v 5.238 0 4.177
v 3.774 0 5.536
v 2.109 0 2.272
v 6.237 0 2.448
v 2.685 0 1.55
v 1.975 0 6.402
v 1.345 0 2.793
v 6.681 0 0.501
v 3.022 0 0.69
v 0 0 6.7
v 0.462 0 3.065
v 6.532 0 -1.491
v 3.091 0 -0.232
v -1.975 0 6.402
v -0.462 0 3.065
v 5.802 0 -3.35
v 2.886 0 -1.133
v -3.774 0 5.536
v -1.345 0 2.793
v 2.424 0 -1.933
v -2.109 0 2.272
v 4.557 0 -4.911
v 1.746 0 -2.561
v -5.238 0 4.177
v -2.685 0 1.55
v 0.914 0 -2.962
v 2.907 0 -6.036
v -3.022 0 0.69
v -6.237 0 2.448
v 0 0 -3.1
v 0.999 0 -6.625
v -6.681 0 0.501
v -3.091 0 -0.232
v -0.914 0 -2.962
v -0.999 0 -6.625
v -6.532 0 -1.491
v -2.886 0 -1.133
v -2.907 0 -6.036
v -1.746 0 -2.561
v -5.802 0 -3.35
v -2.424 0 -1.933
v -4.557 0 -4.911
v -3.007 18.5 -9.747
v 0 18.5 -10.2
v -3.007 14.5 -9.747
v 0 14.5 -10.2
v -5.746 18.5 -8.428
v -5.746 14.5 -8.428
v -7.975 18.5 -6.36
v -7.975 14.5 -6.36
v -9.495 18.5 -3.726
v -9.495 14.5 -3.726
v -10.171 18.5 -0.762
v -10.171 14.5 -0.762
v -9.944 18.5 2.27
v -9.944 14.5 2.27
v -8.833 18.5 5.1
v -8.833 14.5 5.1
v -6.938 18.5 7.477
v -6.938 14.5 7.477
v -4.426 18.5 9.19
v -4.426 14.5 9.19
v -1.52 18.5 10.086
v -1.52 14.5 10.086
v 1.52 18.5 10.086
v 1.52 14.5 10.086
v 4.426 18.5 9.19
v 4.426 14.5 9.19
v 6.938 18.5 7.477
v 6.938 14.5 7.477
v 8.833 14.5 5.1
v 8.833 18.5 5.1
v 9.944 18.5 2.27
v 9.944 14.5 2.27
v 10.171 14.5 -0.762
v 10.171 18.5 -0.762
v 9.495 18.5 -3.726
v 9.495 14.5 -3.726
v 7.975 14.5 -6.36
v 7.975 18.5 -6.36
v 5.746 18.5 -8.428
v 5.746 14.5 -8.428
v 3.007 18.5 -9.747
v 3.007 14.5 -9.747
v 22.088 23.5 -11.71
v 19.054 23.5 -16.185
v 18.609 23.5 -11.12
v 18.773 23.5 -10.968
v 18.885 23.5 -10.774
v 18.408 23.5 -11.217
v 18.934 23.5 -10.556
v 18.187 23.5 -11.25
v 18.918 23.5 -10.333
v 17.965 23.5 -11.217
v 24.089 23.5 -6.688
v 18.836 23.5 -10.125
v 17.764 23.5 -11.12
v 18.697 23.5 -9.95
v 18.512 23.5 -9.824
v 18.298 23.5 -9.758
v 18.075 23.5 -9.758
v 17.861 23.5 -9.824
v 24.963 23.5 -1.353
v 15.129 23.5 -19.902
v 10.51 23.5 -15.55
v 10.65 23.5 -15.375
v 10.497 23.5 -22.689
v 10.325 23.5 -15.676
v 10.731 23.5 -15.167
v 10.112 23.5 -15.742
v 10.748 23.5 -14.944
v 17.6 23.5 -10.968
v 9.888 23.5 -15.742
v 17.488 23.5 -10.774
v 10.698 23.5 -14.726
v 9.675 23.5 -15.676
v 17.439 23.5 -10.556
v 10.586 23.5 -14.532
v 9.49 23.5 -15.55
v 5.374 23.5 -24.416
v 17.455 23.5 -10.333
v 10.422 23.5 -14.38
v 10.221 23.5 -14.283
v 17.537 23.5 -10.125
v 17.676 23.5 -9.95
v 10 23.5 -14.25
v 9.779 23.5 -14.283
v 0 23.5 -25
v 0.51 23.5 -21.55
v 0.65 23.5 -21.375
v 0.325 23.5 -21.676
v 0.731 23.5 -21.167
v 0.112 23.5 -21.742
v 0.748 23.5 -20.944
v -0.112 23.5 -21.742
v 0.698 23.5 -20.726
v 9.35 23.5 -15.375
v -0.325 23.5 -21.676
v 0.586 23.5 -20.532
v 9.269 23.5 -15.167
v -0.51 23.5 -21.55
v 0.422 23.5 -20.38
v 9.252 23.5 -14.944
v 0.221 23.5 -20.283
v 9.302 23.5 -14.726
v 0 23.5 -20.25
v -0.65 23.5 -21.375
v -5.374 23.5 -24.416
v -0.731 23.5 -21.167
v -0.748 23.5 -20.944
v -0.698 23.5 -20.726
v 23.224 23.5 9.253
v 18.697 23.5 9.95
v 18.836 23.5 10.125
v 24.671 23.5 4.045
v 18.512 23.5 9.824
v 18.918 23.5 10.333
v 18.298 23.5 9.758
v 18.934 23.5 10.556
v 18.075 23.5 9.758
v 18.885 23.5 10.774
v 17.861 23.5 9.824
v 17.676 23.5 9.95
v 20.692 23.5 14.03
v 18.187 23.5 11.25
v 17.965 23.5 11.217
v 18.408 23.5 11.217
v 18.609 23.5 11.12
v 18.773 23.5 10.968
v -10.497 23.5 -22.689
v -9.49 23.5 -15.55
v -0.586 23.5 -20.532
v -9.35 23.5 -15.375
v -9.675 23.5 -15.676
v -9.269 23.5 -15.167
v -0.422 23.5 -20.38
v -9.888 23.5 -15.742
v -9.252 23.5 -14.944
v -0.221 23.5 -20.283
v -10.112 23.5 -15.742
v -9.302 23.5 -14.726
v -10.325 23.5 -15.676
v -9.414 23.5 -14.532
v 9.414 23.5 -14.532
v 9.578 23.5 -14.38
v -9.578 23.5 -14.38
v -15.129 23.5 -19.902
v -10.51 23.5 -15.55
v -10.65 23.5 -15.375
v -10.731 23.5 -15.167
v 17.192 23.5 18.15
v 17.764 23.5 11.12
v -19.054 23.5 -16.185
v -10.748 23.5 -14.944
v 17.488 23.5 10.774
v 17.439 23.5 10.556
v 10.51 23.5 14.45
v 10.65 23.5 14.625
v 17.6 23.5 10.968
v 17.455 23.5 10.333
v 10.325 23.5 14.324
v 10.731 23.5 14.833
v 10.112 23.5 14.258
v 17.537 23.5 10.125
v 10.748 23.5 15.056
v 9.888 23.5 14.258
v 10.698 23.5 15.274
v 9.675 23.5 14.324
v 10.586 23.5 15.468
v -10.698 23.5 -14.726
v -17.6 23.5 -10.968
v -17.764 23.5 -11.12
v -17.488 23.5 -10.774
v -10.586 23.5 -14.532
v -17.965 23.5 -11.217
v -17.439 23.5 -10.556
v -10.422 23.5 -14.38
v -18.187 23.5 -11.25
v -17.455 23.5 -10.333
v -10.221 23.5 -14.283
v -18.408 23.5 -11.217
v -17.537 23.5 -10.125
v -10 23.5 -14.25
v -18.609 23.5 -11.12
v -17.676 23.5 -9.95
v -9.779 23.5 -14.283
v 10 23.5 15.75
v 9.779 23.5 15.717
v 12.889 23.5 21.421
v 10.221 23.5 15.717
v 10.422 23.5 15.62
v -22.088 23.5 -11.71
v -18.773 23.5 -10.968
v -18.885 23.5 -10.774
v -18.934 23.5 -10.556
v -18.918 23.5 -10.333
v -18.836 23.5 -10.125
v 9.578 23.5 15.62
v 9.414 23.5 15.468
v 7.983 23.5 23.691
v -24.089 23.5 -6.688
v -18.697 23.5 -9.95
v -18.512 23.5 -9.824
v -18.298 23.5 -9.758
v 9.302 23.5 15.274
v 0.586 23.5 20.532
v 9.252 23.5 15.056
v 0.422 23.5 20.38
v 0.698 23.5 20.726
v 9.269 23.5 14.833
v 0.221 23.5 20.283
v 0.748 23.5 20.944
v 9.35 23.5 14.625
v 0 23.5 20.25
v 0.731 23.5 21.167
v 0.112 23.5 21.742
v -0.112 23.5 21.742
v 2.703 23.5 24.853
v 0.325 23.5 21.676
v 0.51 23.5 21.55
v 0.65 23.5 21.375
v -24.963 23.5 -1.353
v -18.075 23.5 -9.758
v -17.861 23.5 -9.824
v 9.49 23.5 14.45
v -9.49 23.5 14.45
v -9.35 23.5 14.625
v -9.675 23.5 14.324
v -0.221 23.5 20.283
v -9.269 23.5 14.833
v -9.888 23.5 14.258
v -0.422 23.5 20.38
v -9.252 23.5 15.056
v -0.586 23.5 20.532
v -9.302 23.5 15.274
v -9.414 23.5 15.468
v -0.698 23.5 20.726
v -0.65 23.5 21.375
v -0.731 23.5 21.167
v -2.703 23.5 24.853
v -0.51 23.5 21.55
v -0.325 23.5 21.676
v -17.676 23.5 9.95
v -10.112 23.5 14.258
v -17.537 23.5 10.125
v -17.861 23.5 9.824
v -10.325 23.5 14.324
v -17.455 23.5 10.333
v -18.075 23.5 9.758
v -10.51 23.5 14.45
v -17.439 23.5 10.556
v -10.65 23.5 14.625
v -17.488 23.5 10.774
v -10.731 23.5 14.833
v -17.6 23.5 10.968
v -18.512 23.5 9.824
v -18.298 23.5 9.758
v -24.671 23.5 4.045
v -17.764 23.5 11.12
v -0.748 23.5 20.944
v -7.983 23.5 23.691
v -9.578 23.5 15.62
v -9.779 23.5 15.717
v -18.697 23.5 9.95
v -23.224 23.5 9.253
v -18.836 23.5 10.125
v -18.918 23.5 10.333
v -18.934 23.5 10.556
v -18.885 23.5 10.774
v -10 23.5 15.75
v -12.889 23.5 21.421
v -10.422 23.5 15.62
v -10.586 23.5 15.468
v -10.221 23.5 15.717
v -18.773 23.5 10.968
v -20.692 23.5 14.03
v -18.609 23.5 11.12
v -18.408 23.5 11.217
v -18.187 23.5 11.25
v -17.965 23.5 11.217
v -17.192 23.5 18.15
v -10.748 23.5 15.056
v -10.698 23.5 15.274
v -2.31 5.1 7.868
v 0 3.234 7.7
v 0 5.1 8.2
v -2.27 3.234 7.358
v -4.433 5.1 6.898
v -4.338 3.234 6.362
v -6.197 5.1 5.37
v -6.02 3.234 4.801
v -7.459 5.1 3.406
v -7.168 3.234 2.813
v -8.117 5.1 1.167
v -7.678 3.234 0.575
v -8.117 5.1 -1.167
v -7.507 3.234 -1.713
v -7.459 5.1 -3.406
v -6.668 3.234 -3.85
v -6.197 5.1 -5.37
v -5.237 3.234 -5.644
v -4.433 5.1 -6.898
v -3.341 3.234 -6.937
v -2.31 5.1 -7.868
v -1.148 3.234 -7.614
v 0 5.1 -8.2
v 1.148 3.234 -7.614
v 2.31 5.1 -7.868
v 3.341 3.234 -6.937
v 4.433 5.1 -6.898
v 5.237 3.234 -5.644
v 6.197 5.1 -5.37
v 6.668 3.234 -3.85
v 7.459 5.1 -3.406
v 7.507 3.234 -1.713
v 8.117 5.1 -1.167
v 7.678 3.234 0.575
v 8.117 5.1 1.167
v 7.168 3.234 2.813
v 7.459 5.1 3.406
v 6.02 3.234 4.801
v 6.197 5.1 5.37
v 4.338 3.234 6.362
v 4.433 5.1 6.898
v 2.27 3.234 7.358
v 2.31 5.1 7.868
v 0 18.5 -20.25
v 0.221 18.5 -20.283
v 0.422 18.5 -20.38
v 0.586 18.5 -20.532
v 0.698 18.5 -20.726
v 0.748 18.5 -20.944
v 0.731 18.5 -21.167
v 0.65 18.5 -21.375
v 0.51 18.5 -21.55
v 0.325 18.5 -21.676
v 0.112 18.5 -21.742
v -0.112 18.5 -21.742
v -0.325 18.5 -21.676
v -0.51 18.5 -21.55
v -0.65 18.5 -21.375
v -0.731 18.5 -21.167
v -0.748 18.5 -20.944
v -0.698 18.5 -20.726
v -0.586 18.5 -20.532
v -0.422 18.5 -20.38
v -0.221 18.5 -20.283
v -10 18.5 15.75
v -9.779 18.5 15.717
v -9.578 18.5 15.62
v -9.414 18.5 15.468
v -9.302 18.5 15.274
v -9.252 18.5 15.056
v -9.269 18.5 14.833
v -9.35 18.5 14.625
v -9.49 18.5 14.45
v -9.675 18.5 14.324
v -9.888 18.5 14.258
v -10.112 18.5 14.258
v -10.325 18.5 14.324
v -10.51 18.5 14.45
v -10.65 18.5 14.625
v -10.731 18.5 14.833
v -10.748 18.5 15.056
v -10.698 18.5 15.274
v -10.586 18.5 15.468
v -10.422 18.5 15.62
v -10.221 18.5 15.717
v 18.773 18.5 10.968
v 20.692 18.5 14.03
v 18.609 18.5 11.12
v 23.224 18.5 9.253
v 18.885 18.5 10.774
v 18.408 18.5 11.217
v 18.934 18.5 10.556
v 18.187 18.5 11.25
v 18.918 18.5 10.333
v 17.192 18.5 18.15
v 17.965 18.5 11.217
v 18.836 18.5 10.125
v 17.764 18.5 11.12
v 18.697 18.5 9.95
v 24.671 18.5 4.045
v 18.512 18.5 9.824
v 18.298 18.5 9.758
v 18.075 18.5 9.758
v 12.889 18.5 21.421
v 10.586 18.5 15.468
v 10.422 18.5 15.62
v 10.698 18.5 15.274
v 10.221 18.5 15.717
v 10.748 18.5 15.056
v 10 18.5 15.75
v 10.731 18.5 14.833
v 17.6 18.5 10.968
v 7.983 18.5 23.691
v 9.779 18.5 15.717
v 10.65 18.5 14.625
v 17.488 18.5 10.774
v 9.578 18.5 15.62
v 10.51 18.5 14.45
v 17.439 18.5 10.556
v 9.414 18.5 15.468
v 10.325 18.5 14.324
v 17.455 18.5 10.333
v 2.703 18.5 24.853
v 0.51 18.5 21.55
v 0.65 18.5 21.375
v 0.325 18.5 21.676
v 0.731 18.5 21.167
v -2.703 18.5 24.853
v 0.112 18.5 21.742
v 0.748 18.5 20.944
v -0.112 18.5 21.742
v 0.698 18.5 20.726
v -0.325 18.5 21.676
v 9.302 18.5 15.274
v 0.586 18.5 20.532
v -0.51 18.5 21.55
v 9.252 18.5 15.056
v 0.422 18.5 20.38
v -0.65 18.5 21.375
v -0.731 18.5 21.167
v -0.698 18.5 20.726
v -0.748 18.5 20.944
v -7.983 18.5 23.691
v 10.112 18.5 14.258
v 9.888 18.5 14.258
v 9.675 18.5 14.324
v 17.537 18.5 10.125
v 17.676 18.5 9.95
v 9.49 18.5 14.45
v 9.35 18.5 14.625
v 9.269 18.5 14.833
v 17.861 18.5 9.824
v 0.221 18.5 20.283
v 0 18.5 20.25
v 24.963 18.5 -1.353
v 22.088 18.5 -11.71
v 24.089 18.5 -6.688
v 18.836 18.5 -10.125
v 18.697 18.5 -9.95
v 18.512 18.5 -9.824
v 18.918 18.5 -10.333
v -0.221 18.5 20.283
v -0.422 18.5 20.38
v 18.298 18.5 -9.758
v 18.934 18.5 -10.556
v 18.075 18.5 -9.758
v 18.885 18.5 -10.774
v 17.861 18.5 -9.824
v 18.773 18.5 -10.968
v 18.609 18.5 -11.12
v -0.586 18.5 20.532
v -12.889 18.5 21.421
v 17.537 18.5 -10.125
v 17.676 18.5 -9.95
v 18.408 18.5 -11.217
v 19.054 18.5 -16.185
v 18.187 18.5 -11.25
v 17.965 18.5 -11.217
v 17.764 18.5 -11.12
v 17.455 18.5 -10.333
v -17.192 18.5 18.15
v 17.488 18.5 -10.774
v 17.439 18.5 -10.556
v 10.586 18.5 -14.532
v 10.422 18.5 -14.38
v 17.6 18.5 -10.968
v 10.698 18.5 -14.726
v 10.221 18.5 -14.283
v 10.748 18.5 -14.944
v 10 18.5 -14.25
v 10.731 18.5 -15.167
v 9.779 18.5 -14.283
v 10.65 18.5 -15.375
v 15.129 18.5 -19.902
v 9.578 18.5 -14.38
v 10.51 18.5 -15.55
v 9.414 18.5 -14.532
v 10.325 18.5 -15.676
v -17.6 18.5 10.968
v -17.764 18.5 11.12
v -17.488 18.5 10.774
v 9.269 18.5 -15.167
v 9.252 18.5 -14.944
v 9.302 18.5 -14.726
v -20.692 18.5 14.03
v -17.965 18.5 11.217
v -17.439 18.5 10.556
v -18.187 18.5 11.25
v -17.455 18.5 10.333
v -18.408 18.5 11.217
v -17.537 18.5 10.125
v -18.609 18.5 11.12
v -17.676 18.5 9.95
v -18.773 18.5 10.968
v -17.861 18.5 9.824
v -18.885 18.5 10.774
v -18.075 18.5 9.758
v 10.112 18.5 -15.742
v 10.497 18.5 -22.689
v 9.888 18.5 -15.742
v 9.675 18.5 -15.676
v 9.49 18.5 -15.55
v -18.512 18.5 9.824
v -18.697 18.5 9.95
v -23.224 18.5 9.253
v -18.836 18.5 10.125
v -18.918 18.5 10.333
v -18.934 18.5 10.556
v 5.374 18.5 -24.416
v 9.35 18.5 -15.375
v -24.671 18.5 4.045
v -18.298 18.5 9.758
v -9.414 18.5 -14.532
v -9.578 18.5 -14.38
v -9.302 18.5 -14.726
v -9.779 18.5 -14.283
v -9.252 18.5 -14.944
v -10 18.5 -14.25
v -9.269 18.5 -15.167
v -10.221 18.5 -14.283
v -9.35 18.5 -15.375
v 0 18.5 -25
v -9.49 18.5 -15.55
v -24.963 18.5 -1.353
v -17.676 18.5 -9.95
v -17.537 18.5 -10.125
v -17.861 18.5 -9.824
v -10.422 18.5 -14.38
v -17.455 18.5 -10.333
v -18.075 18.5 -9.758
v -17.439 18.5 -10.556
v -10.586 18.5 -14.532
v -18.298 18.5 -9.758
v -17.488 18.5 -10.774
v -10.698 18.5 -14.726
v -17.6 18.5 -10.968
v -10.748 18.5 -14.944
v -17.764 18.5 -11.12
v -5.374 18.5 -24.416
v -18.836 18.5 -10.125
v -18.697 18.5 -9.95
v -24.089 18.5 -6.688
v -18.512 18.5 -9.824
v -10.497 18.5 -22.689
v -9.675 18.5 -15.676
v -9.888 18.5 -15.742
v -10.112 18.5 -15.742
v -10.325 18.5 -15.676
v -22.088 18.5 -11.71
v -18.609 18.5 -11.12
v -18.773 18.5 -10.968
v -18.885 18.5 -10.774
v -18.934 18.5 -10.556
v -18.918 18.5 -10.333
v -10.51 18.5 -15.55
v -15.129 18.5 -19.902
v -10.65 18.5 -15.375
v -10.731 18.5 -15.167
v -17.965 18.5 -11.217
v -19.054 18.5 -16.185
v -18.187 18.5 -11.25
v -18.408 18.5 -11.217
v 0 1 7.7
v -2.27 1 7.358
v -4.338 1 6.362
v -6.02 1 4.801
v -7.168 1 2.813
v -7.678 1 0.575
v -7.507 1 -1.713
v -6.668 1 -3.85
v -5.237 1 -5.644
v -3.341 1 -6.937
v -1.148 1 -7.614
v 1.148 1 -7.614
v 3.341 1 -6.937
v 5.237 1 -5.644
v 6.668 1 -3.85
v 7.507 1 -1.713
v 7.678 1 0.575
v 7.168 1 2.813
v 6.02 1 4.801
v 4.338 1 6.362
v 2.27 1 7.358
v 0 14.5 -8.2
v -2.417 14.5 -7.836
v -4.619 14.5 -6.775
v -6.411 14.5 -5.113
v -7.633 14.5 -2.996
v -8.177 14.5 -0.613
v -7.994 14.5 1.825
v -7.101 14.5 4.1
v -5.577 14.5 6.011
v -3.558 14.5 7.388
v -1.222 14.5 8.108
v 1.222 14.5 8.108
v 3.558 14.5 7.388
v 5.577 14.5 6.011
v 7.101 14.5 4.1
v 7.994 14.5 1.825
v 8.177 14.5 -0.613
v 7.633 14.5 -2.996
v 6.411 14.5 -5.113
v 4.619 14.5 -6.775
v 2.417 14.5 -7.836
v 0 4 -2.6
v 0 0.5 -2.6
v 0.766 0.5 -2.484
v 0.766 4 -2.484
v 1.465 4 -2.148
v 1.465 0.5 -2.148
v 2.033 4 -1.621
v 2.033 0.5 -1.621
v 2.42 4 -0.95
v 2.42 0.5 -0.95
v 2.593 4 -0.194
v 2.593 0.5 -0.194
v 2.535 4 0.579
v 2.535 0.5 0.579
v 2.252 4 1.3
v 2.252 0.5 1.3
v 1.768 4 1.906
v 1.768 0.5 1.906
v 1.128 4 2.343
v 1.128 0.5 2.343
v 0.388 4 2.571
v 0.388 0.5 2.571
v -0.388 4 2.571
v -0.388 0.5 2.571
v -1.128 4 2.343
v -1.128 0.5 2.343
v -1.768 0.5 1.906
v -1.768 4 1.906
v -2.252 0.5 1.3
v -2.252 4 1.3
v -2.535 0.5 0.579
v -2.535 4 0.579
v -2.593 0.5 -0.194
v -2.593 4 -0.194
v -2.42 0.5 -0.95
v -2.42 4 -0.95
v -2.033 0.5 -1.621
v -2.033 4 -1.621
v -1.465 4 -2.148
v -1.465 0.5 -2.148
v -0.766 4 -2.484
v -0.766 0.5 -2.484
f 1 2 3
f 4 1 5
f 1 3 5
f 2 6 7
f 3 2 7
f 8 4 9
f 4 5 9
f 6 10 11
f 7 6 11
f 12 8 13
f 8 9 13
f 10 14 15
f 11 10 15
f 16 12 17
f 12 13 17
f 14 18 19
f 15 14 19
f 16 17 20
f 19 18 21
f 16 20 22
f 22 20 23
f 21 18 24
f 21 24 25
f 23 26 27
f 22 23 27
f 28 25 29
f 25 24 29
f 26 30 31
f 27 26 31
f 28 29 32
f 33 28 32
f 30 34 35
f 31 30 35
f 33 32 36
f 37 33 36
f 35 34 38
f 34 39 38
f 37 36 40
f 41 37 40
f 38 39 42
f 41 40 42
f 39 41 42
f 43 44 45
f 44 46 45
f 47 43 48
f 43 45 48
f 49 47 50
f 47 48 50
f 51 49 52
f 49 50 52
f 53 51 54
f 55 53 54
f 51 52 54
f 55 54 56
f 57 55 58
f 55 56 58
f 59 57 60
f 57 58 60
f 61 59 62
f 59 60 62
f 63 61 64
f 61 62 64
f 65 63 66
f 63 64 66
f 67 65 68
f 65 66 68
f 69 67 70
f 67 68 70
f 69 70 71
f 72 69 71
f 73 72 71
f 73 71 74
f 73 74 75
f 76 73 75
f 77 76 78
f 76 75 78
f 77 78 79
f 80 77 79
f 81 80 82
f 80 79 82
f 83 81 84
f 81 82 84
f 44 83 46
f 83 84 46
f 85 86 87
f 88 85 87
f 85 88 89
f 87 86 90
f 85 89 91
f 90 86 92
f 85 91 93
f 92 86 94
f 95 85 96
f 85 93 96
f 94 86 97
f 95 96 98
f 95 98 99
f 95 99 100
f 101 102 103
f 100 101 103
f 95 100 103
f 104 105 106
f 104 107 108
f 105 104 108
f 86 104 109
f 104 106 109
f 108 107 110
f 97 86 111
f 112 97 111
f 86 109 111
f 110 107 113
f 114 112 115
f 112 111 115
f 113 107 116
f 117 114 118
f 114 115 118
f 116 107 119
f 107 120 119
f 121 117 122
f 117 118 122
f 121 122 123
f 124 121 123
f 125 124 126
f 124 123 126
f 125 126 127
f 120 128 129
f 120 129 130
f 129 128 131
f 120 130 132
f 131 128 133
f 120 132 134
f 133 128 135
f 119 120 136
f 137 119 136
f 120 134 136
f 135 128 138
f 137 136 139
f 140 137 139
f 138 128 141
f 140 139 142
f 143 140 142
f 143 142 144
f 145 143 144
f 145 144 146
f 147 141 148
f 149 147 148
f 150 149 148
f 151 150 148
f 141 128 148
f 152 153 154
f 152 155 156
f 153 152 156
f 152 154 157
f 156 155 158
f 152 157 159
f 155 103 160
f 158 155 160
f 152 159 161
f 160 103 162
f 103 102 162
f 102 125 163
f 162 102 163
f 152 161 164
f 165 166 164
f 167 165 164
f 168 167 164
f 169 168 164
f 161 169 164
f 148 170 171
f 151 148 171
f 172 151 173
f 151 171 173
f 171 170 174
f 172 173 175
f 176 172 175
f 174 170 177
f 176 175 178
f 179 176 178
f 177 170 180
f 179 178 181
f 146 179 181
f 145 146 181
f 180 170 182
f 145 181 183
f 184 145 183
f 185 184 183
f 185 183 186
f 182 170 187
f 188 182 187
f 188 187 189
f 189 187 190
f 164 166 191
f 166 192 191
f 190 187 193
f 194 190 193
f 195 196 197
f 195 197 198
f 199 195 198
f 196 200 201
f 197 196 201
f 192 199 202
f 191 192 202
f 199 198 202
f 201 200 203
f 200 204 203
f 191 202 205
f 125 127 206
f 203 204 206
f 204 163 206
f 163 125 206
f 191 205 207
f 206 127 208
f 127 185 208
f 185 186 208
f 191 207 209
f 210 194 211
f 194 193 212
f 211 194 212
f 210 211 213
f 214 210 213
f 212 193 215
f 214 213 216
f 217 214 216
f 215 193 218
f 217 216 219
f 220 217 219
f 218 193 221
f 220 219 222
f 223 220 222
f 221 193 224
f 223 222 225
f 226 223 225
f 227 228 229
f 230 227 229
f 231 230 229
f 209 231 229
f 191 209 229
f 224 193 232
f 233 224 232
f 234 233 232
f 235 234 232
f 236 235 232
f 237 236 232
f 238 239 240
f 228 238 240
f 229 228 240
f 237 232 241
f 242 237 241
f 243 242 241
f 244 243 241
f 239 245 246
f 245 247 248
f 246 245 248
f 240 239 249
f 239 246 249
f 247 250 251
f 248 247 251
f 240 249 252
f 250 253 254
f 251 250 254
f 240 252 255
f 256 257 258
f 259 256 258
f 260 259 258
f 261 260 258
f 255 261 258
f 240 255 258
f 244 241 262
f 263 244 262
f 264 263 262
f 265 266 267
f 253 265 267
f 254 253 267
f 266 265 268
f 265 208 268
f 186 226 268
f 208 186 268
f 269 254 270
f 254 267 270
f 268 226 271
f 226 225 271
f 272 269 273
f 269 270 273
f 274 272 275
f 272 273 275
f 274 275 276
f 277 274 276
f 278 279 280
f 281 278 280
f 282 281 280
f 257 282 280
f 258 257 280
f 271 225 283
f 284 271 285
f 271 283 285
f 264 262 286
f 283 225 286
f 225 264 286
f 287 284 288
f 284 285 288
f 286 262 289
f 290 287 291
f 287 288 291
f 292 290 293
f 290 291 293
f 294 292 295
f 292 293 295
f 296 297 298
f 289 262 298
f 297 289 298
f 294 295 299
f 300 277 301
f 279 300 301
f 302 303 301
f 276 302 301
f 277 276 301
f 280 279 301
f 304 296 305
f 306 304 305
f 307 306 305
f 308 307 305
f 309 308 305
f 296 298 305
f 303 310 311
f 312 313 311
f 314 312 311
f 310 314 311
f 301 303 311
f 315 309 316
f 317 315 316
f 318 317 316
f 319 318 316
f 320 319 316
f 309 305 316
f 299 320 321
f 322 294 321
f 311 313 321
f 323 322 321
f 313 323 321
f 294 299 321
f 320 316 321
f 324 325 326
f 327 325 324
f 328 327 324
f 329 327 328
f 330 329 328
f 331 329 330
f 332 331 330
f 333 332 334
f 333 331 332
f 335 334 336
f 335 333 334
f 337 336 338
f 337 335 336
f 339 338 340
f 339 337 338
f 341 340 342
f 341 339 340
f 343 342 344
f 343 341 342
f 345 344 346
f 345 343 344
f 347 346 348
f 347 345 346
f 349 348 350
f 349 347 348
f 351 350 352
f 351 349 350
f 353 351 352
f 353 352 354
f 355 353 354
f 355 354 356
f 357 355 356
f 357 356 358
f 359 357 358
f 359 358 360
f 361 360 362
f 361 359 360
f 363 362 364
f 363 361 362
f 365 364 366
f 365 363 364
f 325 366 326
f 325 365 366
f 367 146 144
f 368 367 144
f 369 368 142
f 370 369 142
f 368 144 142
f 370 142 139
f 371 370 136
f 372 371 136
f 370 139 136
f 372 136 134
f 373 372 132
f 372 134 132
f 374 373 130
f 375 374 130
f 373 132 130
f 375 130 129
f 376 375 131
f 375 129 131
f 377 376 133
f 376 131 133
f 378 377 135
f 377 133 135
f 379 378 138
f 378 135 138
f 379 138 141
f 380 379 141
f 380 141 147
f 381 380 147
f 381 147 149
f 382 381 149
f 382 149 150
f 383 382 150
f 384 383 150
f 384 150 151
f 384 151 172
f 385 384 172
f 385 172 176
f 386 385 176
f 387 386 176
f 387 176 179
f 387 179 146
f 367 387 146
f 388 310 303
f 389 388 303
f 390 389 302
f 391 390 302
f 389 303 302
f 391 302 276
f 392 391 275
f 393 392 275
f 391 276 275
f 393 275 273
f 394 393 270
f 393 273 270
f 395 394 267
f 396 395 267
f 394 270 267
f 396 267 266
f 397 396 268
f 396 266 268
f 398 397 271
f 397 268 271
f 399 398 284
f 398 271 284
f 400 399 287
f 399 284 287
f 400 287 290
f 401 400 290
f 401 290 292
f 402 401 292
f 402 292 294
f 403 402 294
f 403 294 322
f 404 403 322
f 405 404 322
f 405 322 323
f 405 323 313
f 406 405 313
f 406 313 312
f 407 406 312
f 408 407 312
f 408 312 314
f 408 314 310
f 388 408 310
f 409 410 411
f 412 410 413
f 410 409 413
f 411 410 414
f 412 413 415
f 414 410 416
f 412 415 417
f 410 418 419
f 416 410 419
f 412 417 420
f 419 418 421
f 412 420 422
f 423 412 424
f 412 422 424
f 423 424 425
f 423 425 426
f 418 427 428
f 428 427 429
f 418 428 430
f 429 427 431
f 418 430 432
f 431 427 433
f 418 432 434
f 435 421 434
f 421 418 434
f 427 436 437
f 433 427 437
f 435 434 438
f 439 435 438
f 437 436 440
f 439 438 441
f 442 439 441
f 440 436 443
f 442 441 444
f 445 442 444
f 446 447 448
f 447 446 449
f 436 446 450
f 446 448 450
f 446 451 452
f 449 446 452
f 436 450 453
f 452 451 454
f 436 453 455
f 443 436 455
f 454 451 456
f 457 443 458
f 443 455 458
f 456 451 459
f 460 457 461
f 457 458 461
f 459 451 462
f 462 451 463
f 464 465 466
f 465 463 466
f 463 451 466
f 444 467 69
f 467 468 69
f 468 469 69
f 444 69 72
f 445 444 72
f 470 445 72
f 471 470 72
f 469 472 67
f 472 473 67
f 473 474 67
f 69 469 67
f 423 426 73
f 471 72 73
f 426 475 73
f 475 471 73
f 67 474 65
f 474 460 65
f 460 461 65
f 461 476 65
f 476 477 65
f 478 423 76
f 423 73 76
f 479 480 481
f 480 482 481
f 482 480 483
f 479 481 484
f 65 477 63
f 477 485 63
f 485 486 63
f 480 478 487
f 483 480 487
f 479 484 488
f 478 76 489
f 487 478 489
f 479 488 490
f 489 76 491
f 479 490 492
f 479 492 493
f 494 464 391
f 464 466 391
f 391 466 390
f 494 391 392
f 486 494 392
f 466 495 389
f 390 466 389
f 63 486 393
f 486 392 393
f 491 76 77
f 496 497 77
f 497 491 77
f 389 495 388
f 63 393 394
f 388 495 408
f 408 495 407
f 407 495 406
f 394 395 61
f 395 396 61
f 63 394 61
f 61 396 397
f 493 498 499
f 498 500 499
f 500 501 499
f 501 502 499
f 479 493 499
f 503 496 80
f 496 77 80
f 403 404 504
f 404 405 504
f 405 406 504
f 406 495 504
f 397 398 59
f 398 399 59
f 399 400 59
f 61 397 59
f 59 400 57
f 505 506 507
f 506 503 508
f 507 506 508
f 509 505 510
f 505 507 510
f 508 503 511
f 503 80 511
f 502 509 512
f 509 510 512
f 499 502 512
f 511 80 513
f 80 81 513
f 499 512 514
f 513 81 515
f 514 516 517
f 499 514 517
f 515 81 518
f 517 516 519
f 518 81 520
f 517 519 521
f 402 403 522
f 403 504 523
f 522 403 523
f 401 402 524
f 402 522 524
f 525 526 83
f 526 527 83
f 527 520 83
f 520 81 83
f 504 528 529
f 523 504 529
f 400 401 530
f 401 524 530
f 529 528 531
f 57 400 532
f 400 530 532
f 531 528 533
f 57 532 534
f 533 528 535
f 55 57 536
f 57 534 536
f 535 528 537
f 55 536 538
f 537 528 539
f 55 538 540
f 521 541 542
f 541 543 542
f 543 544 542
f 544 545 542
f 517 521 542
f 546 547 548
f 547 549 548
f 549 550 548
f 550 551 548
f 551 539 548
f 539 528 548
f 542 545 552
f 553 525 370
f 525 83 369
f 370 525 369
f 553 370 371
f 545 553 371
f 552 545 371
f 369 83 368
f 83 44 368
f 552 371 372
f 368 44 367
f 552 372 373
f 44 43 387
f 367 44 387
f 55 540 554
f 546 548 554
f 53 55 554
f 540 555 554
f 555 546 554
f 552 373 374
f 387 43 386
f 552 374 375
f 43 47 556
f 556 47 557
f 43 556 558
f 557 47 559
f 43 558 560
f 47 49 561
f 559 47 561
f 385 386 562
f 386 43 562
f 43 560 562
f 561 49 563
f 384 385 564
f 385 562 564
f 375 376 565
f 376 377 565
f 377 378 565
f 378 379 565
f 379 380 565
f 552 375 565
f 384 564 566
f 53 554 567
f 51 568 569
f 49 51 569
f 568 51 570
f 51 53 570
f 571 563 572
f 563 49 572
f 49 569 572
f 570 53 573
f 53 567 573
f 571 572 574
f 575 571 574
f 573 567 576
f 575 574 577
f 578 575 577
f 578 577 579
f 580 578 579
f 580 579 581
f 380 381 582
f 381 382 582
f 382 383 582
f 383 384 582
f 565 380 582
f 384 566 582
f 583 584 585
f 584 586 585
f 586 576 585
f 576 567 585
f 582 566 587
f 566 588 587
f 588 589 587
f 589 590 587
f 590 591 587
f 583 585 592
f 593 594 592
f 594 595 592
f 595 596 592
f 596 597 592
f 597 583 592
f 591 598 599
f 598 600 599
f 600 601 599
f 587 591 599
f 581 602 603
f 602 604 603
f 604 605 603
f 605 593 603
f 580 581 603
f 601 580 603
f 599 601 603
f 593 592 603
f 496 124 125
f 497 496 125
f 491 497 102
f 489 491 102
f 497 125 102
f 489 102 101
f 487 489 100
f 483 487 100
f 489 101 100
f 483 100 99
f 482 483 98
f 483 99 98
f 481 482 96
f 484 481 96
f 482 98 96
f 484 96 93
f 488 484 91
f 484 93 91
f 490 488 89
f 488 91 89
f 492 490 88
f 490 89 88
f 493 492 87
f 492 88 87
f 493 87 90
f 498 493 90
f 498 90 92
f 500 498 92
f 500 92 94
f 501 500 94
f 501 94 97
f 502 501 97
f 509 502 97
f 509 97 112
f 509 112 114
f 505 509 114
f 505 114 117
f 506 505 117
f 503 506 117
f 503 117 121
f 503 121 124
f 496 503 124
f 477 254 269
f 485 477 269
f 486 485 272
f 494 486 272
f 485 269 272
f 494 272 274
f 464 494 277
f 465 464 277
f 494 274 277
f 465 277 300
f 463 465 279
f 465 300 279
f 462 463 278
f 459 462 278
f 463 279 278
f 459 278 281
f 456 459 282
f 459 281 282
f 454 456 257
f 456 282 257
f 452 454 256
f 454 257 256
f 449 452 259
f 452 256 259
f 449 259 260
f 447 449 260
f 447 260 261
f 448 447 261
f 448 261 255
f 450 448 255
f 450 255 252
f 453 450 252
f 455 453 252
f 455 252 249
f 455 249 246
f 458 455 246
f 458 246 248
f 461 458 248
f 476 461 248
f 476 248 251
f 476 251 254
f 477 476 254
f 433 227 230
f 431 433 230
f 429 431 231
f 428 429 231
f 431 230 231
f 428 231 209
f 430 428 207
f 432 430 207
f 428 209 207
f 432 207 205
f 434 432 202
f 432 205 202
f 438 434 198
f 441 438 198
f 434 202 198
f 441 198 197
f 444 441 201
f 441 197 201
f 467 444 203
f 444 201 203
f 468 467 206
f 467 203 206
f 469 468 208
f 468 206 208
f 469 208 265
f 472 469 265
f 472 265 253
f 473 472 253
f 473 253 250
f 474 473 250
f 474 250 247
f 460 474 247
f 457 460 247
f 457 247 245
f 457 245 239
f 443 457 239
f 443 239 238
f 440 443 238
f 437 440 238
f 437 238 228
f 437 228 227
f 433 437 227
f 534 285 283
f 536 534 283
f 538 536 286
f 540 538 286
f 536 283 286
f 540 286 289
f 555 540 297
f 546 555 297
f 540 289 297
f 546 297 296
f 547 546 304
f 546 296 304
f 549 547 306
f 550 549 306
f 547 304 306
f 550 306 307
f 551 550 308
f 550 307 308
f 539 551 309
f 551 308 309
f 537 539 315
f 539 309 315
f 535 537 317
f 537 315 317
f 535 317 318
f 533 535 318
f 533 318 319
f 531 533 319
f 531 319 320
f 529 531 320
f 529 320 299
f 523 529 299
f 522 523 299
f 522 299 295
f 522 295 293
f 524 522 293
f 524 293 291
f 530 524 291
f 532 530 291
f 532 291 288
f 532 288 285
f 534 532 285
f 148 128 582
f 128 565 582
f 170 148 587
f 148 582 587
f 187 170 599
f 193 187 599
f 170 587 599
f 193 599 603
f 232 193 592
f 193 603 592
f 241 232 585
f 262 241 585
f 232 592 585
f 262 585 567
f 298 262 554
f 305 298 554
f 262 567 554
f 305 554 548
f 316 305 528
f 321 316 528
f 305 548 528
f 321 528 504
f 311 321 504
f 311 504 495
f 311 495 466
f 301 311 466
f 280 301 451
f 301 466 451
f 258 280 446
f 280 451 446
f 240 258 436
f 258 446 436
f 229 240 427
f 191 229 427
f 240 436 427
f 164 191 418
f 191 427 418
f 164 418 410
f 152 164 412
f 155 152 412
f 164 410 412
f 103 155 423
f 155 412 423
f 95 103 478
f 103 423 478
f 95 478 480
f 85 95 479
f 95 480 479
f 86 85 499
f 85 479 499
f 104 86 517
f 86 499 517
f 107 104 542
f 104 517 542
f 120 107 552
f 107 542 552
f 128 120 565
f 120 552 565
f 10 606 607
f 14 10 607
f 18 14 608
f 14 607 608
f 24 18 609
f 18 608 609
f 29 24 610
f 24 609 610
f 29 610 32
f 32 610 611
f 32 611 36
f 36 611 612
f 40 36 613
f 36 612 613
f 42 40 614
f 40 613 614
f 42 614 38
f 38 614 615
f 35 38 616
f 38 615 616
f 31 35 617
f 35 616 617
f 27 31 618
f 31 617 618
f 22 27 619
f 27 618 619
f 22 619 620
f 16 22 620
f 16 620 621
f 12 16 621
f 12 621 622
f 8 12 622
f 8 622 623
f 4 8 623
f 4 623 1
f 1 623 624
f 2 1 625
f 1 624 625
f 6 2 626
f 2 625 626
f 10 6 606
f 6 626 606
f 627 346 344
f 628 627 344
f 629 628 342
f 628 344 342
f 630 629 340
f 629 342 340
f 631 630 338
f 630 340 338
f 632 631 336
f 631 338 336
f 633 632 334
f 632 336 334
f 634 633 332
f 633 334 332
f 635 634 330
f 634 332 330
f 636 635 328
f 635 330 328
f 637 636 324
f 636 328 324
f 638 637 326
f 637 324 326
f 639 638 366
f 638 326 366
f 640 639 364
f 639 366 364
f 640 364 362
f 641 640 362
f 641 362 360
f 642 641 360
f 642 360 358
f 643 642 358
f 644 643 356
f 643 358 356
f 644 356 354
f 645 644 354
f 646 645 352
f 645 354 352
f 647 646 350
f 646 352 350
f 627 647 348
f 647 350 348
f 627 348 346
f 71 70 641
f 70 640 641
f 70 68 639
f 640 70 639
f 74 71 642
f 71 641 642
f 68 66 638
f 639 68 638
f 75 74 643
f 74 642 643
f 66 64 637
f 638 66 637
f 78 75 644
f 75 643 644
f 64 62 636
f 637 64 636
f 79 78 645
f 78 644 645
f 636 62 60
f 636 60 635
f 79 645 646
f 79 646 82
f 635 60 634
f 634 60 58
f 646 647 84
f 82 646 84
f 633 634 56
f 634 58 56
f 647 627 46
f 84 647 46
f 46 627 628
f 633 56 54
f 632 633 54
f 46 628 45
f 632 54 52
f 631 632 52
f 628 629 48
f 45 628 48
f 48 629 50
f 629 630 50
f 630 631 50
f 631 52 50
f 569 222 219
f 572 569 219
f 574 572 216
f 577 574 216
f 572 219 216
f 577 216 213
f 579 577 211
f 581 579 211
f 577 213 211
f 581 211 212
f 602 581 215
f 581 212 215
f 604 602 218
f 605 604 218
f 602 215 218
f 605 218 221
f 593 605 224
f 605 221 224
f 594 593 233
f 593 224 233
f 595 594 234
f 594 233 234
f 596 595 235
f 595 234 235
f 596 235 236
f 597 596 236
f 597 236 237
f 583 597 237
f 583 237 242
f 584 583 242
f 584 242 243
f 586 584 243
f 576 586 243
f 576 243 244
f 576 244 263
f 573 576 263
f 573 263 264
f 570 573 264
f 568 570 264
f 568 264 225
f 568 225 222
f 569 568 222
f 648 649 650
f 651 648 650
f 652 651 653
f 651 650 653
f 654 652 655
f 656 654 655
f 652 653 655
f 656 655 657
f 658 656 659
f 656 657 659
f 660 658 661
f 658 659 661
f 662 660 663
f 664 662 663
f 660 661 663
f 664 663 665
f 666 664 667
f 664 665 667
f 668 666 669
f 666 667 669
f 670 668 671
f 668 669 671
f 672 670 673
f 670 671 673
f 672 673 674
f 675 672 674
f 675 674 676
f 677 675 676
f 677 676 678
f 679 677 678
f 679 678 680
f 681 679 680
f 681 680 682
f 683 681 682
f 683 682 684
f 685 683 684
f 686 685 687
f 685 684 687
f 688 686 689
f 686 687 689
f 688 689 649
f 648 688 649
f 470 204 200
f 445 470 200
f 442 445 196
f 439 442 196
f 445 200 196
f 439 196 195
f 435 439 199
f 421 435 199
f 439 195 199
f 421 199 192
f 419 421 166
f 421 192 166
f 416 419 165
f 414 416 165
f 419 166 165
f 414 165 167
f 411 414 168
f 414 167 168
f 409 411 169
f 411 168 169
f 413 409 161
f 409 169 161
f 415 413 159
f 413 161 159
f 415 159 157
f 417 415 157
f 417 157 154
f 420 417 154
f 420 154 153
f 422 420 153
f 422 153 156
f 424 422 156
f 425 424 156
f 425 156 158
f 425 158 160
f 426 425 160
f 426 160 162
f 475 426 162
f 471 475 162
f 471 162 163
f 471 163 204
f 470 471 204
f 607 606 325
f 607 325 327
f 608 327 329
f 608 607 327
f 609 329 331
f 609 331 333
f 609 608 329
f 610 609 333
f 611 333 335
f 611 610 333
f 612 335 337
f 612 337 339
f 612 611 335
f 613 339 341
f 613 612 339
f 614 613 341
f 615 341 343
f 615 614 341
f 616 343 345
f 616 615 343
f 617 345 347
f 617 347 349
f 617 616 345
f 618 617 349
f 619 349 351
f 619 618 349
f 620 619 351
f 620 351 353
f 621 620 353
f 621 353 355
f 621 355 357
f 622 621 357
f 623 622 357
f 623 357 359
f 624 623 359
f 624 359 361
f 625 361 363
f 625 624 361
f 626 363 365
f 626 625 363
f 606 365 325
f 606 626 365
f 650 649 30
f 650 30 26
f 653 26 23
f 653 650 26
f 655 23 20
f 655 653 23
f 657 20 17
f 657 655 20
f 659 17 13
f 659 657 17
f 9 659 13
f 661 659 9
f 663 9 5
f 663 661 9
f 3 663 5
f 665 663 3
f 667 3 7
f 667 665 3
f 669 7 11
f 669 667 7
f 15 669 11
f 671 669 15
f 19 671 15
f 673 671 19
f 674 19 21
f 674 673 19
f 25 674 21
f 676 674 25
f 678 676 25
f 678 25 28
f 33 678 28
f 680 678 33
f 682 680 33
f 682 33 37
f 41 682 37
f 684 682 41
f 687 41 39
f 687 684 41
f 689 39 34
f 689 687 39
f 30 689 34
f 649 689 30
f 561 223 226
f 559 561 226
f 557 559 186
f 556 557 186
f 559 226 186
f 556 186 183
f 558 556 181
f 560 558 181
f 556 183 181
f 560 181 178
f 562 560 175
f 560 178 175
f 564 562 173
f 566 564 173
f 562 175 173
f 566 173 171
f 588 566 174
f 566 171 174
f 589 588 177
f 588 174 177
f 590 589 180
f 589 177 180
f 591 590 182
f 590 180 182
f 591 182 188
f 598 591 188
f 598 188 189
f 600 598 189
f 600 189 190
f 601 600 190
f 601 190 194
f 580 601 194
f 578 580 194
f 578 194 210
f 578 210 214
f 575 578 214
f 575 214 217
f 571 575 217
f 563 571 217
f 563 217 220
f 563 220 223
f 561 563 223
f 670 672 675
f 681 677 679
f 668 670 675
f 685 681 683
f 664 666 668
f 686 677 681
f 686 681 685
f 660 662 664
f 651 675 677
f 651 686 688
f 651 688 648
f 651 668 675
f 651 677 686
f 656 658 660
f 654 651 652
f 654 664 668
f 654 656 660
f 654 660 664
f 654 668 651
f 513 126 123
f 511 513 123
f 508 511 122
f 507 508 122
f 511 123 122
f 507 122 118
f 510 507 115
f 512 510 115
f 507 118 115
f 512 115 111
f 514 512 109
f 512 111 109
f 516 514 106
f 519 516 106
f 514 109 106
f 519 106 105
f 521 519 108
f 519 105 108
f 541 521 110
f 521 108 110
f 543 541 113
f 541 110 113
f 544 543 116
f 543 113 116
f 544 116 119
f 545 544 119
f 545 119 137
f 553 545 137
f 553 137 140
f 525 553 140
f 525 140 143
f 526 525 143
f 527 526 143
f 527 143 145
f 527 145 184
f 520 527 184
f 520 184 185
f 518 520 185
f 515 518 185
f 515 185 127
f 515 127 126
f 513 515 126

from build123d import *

# Parameters (mm, degrees)
SKETCH5_R          = 0.75
CUT_EXTRUDE1_DEPTH = 43.452915094
CIRPATTERN2_COUNT  = 6
SKETCH6_R          = 0.75
CUT_EXTRUDE2_DEPTH = 43.452915094
SKETCH7_R          = 2.6
CUT_EXTRUDE3_DEPTH = 4
CHAMFER1_SIZE      = 0.5
CHAMFER2_SIZE      = 1


with BuildPart() as part:
    # Sketch1 → Revolve1 (revolve)
    with BuildSketch(Plane.XY, mode=Mode.PRIVATE) as revolve1_sk:
        Polygon((10.2, 18.5), (10.2, 14.5), (8.2, 14.5), (8.2, 0), (0, 0), (0, 23.5), (25, 23.5), (25, 18.5), align=None)
    revolve(revolve1_sk.sketch.rotate(Axis((0, 0, 0), (0, 1, 0)), 90), axis=Axis((0, 0, 0), (0, 1, 0)))

    # Sketch5 → Cut-Extrude1 (cut, through all)
    with BuildSketch(Plane(origin=(0, 23.5, 0), x_dir=(1, 0, 0), z_dir=(0, 1, 0))):
        with Locations(Location((0, 21, 0), (0, 0, 270))):
            Circle(SKETCH5_R)
    cut_extrude1 = extrude(amount=-CUT_EXTRUDE1_DEPTH, mode=Mode.SUBTRACT)

    # CirPattern2: Cut-Extrude1 ×6 about axis
    cirpattern2_axis = Axis((0, 0, 0), (0, 1, 0))
    for i in range(1, CIRPATTERN2_COUNT):
        add(cut_extrude1.rotate(cirpattern2_axis, i * 360 / CIRPATTERN2_COUNT), mode=Mode.SUBTRACT)

    # Sketch6 → Cut-Extrude2 (cut, through all)
    with BuildSketch(Plane(origin=(0, 23.5, 0), x_dir=(1, 0, 0), z_dir=(0, 1, 0))):
        with Locations(Location((-10, 15, 0), (0, 0, 270))):
            Circle(SKETCH6_R)
        with Locations(Location((10, 15, 0), (0, 0, 270))):
            Circle(SKETCH6_R)
        with Locations(Location((-10, -15, 0), (0, 0, 270))):
            Circle(SKETCH6_R)
        with Locations(Location((10, -15, 0), (0, 0, 270))):
            Circle(SKETCH6_R)
    extrude(amount=-CUT_EXTRUDE2_DEPTH, mode=Mode.SUBTRACT)

    # Sketch7 → Cut-Extrude3 (cut)
    with BuildSketch(Plane.XZ):
        with Locations(Location((0, 0, 0), (0, 0, 270))):
            Circle(SKETCH7_R)
    extrude(amount=-CUT_EXTRUDE3_DEPTH, mode=Mode.SUBTRACT)

    # Sketch8 → Cut-Revolve1 (revolve, cut)
    with BuildSketch(Plane.XY, mode=Mode.PRIVATE) as cut_revolve1_sk:
        Polygon((-8.2, 5.1), (-7.7, 3.233974596), (-7.7, 0), (-8.2, 0), align=None)
    revolve(cut_revolve1_sk.sketch.rotate(Axis((0, 14.5, 0), (0, -1, 0)), 270), axis=Axis((0, 14.5, 0), (0, -1, 0)), mode=Mode.SUBTRACT)

    # Chamfer1
    chamfer1_edges = [part.edges().sort_by_distance(p)[0] for p in [
        (0, 0, 2.6),
    ]]
    chamfer(chamfer1_edges, length=CHAMFER1_SIZE)

    # Chamfer2
    chamfer2_edges = [part.edges().sort_by_distance(p)[0] for p in [
        (0, 0, -7.7),
    ]]
    chamfer(chamfer2_edges, length=CHAMFER2_SIZE)


solid = part.part
